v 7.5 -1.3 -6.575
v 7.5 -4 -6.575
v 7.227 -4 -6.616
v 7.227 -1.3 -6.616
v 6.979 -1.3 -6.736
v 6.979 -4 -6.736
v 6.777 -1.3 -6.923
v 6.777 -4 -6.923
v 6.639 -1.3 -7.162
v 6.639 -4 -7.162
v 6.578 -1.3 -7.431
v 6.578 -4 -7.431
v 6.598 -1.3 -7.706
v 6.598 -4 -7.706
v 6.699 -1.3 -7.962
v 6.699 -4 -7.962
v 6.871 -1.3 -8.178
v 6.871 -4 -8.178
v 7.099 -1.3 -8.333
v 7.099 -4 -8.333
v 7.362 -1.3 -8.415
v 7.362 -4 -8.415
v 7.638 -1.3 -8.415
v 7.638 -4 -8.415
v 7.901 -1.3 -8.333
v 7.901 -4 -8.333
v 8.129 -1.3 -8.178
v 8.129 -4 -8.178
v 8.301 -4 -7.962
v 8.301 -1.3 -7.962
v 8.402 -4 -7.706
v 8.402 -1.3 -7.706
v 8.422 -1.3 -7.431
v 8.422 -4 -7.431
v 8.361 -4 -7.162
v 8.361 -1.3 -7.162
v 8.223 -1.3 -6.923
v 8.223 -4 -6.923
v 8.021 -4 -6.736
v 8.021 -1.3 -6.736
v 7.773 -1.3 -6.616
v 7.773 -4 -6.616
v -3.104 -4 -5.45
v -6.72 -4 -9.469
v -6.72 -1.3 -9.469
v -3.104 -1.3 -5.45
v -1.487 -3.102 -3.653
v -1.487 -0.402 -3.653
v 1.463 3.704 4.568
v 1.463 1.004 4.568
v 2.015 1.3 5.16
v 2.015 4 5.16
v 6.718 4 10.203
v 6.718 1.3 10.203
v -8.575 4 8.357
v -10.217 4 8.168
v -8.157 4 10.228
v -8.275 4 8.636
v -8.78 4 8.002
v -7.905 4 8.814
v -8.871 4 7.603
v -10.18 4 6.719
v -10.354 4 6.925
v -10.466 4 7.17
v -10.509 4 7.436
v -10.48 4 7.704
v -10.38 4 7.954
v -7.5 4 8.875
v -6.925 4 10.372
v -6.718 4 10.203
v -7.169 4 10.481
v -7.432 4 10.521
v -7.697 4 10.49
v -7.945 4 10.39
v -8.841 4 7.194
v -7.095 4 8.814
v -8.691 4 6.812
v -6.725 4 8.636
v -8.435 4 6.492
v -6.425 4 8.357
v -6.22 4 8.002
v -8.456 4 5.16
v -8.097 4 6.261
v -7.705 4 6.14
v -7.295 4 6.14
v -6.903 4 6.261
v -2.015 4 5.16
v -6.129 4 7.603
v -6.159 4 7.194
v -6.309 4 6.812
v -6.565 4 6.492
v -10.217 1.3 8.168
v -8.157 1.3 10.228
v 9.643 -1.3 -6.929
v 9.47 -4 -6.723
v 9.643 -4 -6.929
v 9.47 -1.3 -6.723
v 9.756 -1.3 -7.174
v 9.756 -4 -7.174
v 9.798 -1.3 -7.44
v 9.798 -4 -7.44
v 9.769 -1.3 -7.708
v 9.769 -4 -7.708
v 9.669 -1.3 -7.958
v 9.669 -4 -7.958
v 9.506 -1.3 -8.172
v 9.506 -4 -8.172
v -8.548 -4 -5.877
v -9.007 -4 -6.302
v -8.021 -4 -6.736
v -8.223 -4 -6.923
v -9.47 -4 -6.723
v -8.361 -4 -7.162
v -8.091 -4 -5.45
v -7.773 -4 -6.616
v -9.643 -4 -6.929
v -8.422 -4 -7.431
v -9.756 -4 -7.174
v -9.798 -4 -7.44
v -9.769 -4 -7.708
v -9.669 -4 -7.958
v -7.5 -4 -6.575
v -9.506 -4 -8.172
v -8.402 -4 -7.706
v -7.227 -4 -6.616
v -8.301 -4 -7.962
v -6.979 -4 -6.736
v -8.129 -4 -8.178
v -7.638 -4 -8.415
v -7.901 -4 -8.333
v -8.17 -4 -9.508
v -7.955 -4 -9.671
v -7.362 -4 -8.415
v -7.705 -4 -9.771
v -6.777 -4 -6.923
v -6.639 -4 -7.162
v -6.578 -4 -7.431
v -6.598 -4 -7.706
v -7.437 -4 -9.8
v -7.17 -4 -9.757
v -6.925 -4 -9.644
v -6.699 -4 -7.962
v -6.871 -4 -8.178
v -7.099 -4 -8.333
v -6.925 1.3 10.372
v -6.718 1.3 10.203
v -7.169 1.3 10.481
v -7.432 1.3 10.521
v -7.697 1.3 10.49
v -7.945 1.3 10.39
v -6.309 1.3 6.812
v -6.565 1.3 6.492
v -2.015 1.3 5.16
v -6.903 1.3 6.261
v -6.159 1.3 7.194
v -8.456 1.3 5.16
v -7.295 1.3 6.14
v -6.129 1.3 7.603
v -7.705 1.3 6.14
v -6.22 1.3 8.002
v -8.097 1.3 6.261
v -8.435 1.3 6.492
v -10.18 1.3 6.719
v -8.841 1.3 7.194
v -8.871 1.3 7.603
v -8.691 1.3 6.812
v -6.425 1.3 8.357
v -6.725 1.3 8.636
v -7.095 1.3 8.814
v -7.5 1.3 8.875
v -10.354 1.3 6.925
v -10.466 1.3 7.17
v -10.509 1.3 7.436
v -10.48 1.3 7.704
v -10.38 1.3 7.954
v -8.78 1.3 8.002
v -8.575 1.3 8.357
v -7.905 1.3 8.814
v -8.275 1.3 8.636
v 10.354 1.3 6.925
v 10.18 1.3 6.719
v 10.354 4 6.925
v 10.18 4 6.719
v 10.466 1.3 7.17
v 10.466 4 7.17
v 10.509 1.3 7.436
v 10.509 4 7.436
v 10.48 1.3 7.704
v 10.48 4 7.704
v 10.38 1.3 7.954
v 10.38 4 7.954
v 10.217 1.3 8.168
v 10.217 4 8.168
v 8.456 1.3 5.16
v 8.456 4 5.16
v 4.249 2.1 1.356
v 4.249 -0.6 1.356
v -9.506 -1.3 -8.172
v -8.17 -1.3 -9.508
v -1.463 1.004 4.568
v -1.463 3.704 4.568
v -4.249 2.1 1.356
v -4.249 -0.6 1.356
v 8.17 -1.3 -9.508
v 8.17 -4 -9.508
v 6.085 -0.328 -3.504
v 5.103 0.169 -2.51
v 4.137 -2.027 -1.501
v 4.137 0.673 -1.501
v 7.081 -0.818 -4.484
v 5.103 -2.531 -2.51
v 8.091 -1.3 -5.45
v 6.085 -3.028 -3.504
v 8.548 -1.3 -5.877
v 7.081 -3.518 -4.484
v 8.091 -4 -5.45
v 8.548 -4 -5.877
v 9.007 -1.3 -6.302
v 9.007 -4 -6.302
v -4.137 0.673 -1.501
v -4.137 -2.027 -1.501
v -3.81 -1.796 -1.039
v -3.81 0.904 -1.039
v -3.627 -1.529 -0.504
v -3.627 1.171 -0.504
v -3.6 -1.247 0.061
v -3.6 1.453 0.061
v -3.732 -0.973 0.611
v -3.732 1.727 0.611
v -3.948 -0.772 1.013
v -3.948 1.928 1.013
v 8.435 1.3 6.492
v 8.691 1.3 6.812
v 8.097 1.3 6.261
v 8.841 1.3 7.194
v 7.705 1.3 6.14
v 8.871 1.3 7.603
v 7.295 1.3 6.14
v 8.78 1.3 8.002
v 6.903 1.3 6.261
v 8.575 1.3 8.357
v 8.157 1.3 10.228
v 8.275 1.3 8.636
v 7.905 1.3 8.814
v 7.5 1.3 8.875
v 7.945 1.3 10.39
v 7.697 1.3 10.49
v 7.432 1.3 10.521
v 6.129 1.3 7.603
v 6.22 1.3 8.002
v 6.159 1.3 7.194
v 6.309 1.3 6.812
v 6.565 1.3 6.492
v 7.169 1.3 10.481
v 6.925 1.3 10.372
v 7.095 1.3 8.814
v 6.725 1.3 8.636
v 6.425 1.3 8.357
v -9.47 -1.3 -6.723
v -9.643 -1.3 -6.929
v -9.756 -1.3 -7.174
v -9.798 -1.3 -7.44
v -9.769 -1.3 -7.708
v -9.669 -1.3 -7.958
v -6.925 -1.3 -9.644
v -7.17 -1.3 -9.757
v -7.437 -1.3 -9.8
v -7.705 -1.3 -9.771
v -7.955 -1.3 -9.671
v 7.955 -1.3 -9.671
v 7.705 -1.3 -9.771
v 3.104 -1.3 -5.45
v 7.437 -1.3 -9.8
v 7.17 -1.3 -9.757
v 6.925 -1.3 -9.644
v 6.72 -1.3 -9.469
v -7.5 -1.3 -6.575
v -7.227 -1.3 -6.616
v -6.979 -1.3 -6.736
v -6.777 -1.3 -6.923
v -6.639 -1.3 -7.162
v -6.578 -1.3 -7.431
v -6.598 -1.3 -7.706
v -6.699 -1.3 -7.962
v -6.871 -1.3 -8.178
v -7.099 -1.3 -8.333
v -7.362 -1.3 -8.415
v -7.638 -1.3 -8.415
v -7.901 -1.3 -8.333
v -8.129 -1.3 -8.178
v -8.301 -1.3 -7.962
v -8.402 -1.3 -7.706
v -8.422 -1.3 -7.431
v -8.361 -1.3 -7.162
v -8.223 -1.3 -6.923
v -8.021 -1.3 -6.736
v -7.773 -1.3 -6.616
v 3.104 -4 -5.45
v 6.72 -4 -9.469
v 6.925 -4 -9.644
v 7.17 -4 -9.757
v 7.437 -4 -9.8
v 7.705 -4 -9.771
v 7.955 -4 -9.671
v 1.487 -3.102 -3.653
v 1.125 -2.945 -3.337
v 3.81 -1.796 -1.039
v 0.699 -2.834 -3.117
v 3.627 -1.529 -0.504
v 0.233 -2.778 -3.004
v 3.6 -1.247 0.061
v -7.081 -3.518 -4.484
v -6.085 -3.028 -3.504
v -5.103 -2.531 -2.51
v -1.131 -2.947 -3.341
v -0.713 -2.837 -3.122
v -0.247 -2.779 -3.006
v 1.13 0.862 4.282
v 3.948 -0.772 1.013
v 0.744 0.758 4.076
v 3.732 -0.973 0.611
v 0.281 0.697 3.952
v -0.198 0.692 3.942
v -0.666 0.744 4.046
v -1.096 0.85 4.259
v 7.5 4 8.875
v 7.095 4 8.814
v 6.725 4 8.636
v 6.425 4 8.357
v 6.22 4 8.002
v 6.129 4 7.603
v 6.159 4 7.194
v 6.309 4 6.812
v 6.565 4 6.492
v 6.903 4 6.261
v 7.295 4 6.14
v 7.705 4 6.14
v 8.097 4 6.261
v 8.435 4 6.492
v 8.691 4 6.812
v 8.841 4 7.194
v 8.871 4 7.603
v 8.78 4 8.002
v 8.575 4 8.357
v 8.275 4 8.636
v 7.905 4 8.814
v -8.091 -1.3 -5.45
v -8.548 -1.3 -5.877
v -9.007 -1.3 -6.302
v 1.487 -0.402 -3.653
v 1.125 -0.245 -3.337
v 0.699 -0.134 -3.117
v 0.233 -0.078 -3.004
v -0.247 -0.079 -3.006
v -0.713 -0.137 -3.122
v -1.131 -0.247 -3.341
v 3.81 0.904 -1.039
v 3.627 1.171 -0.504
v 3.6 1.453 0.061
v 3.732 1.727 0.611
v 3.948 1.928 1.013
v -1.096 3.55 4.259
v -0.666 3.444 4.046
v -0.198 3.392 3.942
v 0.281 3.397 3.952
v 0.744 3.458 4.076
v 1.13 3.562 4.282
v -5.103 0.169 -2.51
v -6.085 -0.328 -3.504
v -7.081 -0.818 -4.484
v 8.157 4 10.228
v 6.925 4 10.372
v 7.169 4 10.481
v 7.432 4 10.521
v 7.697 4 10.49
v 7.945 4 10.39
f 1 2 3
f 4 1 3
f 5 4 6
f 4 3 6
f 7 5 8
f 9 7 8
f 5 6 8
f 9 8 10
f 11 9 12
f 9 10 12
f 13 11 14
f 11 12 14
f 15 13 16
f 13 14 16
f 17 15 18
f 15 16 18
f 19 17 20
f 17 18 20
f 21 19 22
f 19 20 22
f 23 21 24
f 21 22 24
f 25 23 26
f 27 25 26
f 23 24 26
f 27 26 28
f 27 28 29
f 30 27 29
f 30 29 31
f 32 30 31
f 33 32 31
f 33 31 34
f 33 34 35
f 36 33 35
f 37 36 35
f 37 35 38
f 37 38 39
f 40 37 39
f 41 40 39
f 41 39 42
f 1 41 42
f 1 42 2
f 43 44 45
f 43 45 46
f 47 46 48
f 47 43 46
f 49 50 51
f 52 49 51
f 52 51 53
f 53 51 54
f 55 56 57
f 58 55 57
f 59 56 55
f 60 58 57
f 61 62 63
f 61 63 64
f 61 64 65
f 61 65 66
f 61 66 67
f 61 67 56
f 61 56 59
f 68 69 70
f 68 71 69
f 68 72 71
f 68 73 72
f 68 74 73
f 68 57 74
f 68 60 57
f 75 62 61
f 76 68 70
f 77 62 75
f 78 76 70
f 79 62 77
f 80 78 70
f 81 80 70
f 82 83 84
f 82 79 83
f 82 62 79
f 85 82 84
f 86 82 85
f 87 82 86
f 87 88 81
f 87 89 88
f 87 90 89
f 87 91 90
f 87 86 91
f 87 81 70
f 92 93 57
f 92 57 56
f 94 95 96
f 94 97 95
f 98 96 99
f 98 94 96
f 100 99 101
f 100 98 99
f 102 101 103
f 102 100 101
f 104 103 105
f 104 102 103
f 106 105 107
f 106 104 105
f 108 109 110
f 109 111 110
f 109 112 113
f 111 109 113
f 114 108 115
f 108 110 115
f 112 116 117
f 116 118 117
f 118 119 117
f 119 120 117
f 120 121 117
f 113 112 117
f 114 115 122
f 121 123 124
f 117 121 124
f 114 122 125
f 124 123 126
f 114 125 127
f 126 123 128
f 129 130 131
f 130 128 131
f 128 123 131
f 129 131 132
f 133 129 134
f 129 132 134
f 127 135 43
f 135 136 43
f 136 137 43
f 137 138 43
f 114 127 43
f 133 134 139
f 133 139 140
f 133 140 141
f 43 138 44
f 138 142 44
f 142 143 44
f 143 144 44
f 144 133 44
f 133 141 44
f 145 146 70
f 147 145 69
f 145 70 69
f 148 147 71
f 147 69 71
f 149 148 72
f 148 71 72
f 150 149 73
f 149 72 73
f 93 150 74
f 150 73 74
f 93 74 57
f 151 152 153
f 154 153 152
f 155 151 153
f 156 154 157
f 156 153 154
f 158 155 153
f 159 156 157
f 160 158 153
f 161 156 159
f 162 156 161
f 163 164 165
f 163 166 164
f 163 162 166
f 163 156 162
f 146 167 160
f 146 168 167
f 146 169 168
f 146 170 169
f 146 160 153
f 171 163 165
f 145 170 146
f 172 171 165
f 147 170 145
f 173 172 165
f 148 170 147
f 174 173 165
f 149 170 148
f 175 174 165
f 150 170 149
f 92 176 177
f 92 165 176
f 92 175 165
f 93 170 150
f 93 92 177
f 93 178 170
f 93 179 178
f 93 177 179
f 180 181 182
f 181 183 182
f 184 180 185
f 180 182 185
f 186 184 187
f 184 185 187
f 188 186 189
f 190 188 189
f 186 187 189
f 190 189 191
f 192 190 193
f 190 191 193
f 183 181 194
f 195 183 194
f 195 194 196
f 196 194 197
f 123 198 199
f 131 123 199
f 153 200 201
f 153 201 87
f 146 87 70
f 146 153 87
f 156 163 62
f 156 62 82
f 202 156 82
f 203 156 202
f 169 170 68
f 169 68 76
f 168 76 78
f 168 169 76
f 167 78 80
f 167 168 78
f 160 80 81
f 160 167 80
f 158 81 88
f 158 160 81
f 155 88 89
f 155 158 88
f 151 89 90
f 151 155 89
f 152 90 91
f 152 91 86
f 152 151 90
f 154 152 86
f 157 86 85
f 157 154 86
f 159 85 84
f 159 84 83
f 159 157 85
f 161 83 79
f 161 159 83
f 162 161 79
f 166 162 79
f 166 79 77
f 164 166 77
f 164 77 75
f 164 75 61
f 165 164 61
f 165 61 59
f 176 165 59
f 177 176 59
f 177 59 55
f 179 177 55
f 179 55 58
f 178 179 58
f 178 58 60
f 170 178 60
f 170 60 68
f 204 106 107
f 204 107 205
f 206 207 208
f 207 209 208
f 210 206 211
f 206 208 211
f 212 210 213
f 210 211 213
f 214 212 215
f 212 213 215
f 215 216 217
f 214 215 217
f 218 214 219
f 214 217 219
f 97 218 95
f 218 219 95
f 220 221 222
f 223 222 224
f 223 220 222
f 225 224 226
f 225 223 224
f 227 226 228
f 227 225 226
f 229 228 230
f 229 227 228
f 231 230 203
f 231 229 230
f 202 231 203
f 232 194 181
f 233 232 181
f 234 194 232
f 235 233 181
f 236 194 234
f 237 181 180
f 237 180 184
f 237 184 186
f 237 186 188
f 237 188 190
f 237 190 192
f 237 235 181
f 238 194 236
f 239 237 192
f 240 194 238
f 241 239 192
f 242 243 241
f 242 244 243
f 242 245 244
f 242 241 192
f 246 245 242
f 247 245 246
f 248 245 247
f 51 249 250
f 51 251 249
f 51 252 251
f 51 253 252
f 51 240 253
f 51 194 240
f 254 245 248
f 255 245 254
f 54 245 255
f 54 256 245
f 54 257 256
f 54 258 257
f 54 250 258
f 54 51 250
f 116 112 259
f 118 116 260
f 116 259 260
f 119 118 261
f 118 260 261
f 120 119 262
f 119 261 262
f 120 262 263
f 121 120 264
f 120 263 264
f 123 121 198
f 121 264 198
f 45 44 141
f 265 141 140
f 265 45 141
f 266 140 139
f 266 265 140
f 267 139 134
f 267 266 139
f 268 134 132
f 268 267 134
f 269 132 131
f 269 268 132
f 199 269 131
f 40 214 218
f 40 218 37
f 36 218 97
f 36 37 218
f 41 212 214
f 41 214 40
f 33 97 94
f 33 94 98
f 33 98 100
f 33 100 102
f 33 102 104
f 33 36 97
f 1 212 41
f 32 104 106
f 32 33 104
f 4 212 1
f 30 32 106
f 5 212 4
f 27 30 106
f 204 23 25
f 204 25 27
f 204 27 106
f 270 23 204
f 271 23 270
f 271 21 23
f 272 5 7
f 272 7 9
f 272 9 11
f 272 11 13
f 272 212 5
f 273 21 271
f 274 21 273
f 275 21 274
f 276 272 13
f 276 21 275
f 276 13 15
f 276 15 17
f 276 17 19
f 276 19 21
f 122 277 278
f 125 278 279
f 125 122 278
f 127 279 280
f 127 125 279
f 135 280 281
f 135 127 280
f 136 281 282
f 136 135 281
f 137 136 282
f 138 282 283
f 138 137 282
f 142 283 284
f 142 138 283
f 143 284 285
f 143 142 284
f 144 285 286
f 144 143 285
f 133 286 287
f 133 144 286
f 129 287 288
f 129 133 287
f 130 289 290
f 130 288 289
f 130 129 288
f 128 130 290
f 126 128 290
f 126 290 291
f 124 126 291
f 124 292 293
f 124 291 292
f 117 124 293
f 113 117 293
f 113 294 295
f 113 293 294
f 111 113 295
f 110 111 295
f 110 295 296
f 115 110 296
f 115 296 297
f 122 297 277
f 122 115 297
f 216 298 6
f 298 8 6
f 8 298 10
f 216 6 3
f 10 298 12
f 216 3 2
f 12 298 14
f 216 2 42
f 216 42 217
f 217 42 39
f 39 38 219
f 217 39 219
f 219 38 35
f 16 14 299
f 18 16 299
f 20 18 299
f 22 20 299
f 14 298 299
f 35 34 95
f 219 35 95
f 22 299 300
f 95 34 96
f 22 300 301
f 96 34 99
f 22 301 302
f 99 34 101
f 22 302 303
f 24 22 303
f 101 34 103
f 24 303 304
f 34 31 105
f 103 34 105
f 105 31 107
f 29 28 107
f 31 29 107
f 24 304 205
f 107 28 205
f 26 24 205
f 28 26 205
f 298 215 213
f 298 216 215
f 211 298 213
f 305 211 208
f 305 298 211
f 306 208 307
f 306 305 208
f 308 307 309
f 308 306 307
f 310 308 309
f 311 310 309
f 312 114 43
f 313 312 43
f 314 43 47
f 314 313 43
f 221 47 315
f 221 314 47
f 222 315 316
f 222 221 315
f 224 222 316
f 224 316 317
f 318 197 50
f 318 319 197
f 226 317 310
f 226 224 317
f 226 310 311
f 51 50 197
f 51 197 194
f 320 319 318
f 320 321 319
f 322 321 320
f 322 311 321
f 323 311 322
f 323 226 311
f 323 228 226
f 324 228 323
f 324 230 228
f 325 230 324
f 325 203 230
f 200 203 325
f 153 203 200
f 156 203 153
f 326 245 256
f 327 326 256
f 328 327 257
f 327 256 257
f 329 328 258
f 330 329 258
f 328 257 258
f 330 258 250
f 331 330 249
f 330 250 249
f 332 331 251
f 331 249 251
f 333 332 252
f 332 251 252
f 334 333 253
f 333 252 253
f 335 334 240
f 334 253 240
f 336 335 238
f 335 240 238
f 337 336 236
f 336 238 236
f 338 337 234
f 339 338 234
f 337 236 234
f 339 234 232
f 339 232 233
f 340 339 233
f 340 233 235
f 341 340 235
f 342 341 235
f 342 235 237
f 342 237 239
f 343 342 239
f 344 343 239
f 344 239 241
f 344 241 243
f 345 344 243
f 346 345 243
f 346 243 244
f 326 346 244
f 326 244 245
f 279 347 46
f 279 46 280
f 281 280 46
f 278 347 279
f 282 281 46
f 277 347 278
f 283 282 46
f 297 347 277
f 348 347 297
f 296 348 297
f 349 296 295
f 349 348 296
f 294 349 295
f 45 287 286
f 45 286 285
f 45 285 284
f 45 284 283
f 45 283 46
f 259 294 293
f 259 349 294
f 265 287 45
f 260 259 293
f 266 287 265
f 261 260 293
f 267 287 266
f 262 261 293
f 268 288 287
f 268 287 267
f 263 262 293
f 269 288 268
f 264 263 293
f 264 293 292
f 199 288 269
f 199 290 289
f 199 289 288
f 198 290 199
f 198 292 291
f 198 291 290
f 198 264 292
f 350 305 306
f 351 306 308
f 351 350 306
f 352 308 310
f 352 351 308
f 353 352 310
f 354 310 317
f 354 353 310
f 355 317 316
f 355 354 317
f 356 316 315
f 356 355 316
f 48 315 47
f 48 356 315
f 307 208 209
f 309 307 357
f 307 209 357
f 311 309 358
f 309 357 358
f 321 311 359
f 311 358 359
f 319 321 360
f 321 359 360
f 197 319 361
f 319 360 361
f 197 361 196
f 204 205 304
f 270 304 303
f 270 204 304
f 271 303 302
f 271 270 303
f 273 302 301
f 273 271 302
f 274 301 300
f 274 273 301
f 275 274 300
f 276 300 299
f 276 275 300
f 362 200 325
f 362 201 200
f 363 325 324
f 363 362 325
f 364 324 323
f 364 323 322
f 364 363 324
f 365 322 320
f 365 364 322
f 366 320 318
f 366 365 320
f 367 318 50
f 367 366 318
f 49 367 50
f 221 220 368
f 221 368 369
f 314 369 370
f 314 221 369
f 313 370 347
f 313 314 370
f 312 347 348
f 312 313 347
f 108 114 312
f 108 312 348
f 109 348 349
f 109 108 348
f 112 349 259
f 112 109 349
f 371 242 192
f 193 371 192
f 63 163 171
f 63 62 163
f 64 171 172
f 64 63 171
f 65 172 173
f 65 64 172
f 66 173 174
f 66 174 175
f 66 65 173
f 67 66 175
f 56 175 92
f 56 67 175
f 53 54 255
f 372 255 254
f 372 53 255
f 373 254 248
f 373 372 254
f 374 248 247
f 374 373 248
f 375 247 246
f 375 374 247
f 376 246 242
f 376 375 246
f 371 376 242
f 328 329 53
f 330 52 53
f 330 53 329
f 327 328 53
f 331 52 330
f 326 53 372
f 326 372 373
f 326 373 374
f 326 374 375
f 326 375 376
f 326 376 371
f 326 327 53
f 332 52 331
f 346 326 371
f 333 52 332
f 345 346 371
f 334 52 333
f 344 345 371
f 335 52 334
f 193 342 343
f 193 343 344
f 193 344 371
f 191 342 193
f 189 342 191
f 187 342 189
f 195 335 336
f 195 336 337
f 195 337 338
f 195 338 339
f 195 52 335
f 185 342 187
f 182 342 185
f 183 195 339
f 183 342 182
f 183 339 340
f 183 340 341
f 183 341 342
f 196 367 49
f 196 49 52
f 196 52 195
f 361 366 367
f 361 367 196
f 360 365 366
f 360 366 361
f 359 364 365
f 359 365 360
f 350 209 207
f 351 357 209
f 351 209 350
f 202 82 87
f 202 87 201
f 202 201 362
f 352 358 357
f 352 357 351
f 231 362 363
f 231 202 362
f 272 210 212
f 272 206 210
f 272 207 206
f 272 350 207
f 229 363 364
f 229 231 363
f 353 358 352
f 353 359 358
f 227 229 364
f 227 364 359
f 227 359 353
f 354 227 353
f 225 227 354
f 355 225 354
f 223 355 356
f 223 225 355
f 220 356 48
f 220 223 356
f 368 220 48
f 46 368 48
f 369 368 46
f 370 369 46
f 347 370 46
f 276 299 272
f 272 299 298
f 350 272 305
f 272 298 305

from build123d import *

# Parameters (mm, degrees)
BOSS_EXTRUDE1_DEPTH      = 4
BOSS_EXTRUDE1_DEPTH_BACK = 4
SKETCH1_R                = 1.375
SKETCH1_R_2              = 0.925
CUT_EXTRUDE1_DEPTH       = 29.461459085
CUT_EXTRUDE1_DEPTH_BACK  = 29.461459085
FILLET1_R                = 2
FILLET2_R                = 1


with BuildPart() as part:
    # Sketch1 → Boss-Extrude1 (new, two sides: drawn at the far end of the back side and taken through both)
    with BuildSketch(Plane(origin=(0, 0, 0), x_dir=(1, 0, 0), z_dir=(0, 1, 0)).offset(-BOSS_EXTRUDE1_DEPTH_BACK)):
        with BuildLine():
            Line((0, 2), (-7.424621202, 10.253048327))
            Line((-7.424621202, 10.253048327), (-10.253048327, 7.424621202))
            ThreePointArc((-10.253048327, 7.424621202), (-6.398566018, 3.816356305), (-2.75, 0))
            Line((-2.75, 0), (-10.960155108, -7.424621202))
            Line((-10.960155108, -7.424621202), (-7.424621202, -10.960155108))
            Line((-7.424621202, -10.960155108), (0, -3))
            Line((0, -3), (0, 0))
            Line((0, 0), (0, 2))
        make_face()
        with Locations((-7.5, -7.5)):
            Circle(SKETCH1_R, mode=Mode.SUBTRACT)
        with Locations((-7.5, 7.5)):
            Circle(SKETCH1_R_2, mode=Mode.SUBTRACT)
    extrude(amount=BOSS_EXTRUDE1_DEPTH + BOSS_EXTRUDE1_DEPTH_BACK)

    # Mirror2: part across plane


with BuildPart() as part_1:
    add(part.part)
    add(part.part.mirror(Plane(origin=(0, -4, 0), x_dir=(0, 0, 1), z_dir=(-1, 0, 0))))

    # Sketch3 → Cut-Extrude1 (cut, two sides: drawn at the far end of the back side and taken through both)
    with BuildSketch(Plane(origin=(-15, 0, 0), x_dir=(0, 0, -1), z_dir=(1, 0, 0)).offset(-CUT_EXTRUDE1_DEPTH_BACK)):
        Polygon((5.45, -1.3), (10.25, -1.3), (10.25, 4), (-5.16, 4), align=None)
        Polygon((-10.96, -4), (5.45, -4), (-5.16, 1.3), (-10.96, 1.3), align=None)
    extrude(amount=CUT_EXTRUDE1_DEPTH + CUT_EXTRUDE1_DEPTH_BACK, mode=Mode.SUBTRACT)

    # Fillet1
    fillet1_edges = [part_1.edges().sort_by_distance(p)[0] for p in [
        (2.75, 0.072431668, 0),
        (-2.75, 0.072431668, 0),
        (0, -0.926625825, -2),
        (0, 1.571017908, 3),
    ]]
    fillet(fillet1_edges, radius=FILLET1_R)

    # Fillet2
    fillet2_edges = [part_1.edges().sort_by_distance(p)[0] for p in [
        (-7.424621202, 0, -10.253048327),
        (-10.253048327, -2.65, -7.424621202),
        (7.424621202, 0, -10.253048327),
        (10.253048327, -2.65, -7.424621202),
        (10.960155108, 2.65, 7.424621202),
        (7.424621202, 0, 10.960155108),
        (-10.960155108, 2.65, 7.424621202),
        (-7.424621202, 0, 10.960155108),
    ]]
    fillet(fillet2_edges, radius=FILLET2_R)


solid = part_1.part
